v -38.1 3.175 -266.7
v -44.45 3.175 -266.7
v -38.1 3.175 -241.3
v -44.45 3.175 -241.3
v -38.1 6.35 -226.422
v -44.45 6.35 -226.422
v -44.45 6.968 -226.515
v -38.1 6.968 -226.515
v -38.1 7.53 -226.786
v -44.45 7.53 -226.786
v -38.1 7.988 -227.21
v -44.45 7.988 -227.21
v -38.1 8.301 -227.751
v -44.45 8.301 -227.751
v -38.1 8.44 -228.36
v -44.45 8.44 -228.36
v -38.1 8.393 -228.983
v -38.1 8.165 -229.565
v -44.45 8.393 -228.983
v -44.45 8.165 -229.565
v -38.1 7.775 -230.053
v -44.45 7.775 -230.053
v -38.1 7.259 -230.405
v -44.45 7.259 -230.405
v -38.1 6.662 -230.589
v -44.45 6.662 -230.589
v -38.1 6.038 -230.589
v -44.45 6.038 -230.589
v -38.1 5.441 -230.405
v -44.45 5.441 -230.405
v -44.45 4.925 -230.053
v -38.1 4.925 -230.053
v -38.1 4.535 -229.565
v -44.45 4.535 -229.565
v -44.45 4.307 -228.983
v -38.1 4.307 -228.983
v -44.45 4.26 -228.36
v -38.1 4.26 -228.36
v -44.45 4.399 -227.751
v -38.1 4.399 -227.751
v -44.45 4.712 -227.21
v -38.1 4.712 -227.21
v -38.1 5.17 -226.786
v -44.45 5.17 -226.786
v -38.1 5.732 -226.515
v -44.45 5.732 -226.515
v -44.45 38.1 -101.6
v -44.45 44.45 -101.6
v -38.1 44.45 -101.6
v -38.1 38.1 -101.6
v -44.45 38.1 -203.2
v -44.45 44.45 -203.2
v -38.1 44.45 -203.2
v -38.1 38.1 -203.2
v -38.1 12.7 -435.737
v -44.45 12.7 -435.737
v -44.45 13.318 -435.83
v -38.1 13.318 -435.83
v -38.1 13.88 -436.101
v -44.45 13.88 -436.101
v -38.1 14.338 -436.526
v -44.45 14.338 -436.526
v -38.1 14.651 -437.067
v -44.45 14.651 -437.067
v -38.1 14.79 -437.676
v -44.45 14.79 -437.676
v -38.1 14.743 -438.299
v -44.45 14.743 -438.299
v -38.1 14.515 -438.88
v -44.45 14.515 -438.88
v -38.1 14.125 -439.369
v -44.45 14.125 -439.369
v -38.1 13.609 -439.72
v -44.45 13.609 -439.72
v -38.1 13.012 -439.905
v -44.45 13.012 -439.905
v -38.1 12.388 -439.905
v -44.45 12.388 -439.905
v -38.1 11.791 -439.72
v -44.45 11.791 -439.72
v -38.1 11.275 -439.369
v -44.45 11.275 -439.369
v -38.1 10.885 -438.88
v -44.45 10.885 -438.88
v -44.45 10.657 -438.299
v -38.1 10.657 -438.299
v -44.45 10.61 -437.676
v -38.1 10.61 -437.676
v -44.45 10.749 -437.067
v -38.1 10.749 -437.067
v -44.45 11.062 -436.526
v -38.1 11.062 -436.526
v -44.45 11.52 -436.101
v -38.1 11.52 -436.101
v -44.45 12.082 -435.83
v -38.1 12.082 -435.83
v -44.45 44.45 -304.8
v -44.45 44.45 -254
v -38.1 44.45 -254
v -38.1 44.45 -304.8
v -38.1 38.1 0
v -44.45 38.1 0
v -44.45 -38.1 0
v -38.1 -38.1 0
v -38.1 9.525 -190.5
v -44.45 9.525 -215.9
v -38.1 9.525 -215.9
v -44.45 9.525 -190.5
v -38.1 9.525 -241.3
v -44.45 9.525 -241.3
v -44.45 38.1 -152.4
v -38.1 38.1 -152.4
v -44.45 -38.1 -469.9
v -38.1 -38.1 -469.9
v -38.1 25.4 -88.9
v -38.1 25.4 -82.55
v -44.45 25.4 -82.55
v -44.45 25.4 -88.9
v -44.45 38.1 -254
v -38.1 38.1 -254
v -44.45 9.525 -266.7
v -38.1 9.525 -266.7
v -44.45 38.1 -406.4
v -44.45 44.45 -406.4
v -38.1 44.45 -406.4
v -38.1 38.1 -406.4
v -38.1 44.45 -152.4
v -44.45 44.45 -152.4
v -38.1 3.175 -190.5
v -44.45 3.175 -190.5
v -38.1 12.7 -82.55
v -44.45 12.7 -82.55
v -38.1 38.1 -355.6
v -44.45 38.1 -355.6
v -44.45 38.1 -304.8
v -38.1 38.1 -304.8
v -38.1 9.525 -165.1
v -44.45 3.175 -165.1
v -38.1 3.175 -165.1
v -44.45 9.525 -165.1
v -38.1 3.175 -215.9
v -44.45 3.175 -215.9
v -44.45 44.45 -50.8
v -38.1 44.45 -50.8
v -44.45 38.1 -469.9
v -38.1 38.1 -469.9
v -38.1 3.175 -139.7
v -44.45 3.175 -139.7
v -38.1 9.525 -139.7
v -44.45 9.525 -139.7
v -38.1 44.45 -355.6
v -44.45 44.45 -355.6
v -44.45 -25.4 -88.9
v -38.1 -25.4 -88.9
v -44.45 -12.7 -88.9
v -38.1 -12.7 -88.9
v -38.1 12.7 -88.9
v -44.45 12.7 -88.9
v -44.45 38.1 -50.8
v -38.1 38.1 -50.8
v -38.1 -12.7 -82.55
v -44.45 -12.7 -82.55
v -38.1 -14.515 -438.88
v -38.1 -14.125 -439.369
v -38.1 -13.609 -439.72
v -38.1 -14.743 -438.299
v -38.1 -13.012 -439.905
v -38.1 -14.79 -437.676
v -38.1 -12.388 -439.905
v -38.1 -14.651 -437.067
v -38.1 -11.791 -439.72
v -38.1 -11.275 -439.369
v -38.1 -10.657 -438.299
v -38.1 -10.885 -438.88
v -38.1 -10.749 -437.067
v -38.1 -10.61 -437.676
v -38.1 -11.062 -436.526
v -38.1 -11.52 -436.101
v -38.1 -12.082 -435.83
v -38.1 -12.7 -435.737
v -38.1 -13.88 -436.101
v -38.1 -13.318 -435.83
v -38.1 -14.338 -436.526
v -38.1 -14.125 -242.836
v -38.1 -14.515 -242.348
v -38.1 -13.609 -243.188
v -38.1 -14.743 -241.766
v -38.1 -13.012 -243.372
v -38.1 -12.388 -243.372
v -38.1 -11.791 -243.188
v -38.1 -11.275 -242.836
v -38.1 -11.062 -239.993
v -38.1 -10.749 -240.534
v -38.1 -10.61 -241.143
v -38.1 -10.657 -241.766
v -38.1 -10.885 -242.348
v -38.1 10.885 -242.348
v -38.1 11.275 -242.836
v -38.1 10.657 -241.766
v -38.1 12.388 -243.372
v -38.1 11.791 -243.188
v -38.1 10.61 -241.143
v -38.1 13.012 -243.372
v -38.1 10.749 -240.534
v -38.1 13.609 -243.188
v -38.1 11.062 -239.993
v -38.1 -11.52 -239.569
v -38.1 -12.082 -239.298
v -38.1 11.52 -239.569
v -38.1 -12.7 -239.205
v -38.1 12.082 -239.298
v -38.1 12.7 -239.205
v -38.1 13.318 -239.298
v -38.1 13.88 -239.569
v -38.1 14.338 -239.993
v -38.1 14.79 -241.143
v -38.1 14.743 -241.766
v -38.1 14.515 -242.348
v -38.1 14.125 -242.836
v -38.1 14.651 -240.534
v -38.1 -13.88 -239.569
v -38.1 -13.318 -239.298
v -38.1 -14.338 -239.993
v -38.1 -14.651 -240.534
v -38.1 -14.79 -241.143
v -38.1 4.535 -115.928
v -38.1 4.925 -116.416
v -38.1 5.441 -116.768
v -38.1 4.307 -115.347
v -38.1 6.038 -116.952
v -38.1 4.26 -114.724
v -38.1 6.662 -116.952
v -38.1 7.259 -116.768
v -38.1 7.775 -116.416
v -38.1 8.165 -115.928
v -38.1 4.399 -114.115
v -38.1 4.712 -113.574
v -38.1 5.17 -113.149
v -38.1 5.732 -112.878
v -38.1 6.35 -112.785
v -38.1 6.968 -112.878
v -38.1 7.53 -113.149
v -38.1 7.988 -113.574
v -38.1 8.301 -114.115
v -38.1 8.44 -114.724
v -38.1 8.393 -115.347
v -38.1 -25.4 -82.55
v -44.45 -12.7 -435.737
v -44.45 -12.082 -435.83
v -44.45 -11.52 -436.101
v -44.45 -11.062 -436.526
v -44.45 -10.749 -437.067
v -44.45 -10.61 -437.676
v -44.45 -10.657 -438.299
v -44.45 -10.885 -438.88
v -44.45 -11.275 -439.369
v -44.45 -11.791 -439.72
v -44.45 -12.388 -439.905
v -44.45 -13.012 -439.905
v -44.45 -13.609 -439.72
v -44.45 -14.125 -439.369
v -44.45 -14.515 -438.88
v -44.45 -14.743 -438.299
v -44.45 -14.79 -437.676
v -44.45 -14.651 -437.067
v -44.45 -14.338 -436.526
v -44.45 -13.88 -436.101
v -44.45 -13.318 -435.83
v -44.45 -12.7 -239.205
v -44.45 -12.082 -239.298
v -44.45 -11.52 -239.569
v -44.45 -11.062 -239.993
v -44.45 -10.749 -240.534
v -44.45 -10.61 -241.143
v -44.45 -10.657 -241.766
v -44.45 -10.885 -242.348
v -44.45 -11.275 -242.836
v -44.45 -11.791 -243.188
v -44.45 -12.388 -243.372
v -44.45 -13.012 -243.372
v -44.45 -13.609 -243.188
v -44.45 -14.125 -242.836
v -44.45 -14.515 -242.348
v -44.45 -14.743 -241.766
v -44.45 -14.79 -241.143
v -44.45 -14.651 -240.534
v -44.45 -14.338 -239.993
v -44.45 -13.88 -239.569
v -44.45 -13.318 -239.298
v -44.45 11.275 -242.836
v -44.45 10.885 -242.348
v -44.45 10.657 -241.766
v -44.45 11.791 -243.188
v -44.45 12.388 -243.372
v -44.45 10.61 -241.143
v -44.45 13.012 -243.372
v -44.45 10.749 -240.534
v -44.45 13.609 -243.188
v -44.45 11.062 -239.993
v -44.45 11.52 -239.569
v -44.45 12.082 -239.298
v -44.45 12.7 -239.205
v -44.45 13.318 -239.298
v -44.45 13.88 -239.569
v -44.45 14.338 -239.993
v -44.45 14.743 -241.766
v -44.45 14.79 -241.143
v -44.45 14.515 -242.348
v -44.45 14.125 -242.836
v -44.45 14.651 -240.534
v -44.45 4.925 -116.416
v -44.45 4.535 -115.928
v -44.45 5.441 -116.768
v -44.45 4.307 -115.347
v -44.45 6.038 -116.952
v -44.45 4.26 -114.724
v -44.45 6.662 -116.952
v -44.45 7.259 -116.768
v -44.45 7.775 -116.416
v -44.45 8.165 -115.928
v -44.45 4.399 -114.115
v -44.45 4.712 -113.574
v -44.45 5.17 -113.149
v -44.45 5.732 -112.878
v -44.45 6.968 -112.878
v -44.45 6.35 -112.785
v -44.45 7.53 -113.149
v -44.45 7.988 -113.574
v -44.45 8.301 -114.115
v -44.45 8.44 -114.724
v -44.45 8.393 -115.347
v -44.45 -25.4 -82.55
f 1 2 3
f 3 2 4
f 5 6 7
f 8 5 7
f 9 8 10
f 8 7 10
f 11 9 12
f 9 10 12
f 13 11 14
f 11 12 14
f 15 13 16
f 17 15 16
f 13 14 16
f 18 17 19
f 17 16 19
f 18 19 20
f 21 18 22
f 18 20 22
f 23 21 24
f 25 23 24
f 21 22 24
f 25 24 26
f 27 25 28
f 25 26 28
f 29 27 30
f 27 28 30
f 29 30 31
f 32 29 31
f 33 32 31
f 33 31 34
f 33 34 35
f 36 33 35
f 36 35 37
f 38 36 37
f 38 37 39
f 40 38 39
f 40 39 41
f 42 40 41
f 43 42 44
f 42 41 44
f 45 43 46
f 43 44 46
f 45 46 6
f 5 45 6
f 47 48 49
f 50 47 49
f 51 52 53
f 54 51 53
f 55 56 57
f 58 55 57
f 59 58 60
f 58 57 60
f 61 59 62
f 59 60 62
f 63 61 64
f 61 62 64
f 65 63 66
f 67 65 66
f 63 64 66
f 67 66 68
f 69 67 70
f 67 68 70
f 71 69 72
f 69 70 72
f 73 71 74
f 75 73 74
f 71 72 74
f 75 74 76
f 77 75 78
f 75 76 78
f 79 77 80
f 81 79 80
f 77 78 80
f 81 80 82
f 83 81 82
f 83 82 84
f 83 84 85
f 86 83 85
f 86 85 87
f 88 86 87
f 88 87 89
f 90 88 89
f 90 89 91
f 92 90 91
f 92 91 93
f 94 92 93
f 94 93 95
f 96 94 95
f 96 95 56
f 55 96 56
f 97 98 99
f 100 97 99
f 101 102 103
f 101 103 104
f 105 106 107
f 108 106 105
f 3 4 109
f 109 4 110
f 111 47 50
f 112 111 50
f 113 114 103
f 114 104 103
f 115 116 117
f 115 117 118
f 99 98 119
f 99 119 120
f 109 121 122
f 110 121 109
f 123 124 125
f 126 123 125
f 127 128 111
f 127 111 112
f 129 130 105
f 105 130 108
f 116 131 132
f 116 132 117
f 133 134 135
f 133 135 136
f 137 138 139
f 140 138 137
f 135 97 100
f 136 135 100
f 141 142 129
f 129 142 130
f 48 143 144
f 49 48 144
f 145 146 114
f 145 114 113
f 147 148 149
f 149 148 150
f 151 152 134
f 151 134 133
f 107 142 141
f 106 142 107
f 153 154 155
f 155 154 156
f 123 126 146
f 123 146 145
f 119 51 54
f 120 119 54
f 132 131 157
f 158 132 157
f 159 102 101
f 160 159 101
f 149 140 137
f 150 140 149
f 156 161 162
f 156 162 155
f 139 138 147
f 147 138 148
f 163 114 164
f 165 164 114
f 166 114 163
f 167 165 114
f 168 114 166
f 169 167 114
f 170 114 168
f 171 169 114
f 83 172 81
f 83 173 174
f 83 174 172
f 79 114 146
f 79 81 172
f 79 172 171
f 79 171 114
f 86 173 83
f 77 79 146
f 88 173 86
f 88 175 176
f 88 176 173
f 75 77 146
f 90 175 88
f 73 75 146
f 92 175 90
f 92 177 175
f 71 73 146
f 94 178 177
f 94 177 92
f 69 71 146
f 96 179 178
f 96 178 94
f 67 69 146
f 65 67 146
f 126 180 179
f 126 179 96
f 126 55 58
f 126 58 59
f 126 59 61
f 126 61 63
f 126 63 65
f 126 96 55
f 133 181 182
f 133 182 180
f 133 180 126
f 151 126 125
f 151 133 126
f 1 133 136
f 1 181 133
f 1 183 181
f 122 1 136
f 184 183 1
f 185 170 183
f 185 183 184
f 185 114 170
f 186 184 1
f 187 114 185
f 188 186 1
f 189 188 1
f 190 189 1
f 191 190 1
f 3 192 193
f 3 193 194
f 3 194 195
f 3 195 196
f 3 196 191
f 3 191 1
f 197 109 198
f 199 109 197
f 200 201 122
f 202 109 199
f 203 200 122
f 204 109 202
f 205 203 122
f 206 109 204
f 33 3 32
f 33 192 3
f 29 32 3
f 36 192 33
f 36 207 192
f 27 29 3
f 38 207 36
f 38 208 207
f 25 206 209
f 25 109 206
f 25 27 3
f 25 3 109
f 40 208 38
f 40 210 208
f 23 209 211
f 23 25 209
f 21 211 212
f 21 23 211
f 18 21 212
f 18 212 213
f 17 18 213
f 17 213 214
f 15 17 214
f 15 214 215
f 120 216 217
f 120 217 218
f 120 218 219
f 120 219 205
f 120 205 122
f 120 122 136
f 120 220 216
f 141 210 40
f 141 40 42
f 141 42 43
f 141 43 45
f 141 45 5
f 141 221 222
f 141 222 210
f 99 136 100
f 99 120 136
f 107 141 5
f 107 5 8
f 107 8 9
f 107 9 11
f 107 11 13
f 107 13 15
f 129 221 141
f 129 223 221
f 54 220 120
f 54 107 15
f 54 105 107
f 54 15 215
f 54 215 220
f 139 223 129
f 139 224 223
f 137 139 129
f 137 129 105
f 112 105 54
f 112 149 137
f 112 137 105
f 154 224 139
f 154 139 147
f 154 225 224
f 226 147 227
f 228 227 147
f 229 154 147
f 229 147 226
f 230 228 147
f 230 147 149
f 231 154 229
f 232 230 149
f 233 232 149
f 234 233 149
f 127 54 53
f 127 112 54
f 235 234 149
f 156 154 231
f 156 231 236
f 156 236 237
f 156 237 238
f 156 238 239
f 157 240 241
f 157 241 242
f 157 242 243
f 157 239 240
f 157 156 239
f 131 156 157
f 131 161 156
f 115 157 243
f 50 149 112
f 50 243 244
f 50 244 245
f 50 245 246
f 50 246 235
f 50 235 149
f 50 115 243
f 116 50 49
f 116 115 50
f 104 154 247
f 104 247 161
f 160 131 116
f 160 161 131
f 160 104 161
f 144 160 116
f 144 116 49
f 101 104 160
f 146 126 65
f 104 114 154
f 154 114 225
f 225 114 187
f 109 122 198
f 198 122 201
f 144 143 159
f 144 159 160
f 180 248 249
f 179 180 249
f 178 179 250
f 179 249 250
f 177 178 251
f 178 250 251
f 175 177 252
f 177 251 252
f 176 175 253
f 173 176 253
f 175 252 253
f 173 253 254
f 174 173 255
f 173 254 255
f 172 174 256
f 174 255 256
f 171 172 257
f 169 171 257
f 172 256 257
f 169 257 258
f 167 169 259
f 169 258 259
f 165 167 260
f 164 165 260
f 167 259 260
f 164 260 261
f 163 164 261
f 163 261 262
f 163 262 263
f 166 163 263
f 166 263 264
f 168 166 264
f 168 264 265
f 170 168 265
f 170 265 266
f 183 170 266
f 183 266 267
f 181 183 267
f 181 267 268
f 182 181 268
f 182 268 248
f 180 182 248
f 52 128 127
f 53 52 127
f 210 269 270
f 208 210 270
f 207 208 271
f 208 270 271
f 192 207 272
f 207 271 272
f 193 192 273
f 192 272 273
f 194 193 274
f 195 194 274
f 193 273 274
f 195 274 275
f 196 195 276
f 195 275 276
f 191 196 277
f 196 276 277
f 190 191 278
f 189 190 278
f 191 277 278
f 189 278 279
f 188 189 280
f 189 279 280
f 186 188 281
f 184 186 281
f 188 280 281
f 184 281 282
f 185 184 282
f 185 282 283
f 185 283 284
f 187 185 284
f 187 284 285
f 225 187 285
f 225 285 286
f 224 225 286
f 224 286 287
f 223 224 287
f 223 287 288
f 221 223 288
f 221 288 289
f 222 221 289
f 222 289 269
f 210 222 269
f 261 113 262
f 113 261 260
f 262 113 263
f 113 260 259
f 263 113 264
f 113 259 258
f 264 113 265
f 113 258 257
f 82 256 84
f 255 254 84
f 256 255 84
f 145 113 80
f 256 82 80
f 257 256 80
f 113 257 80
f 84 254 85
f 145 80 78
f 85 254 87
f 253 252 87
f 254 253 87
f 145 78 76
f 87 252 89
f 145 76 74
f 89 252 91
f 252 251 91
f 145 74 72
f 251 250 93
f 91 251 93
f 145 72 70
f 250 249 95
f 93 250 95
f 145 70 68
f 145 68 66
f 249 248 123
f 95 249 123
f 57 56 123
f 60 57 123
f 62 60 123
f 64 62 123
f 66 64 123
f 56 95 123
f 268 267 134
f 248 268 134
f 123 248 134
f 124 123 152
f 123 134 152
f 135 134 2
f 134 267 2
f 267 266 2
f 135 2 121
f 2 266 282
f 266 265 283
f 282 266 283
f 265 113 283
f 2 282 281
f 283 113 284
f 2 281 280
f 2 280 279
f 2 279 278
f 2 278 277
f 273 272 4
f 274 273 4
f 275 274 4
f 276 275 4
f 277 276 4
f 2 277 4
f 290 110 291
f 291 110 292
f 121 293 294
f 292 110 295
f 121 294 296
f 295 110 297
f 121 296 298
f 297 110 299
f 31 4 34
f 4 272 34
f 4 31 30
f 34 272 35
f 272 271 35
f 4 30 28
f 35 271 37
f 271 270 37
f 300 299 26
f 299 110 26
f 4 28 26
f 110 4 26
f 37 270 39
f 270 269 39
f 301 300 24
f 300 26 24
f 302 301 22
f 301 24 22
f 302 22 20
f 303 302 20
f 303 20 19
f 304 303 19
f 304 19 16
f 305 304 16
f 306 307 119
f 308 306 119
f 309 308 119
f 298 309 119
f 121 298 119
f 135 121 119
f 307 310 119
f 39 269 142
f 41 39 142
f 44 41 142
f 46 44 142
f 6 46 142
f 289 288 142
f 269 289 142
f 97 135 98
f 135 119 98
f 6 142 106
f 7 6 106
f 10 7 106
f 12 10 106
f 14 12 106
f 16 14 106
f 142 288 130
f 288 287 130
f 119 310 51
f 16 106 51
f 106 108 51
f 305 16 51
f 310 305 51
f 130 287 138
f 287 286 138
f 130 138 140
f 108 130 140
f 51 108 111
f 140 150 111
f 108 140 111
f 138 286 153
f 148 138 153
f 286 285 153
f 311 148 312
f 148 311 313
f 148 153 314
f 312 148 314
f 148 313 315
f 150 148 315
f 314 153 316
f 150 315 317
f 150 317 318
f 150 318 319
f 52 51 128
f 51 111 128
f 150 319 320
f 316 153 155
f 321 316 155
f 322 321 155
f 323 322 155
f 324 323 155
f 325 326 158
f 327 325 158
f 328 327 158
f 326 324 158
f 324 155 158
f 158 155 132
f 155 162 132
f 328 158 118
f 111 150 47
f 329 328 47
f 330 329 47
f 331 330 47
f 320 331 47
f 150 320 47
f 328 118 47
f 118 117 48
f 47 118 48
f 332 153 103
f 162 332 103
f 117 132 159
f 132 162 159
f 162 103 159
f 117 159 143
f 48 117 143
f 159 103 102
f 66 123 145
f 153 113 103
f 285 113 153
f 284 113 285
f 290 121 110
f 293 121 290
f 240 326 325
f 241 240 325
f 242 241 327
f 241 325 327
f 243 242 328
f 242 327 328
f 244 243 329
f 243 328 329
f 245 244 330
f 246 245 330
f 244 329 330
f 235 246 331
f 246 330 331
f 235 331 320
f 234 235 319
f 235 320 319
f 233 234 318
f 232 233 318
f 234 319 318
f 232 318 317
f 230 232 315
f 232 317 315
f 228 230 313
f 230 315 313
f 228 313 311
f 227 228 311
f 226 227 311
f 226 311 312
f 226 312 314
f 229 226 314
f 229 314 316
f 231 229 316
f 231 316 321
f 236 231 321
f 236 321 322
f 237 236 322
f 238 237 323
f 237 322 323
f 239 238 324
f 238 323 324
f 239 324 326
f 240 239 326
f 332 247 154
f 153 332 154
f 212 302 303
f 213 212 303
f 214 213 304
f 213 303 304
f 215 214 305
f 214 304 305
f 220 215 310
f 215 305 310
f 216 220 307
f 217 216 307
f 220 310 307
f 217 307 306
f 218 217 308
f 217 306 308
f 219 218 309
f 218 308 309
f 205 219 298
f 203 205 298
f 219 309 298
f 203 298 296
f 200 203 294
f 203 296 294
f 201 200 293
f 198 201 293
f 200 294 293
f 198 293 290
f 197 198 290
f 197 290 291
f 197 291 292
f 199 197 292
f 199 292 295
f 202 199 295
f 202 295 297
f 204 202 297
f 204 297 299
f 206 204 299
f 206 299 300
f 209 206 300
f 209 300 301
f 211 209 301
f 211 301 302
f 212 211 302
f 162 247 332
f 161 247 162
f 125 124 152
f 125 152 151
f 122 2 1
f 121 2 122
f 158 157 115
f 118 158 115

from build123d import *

# Parameters (mm, degrees)
SKETCH1_W           = 6.35
SKETCH1_H           = 76.2
BOSS_EXTRUDE1_DEPTH = 457.2
SKETCH2_W           = 6.35
SKETCH2_H           = 50.8
BOSS_EXTRUDE2_DEPTH = 6.35
SKETCH3_W           = 6.35
SKETCH3_H           = 12.7
CUT_EXTRUDE1_DEPTH  = 460.399570091
SKETCH7_R           = 2.0955
CUT_EXTRUDE2_DEPTH  = 460.399570091
SKETCH9_R           = 2.0955
SKETCH9_W           = 25.4
SKETCH9_H           = 6.35
CUT_EXTRUDE3_DEPTH  = 6.35
SKETCH11_W          = 6.35
SKETCH11_H          = 76.2
BOSS_EXTRUDE5_DEPTH = 12.7


with BuildPart() as part:
    # Sketch1 → Boss-Extrude1 (new body)
    with BuildSketch(Plane.XY):
        with Locations((-41.275, 0)):
            Rectangle(SKETCH1_W, SKETCH1_H)
    extrude(amount=-BOSS_EXTRUDE1_DEPTH)

    # Sketch2 → Boss-Extrude2 (add)
    with BuildSketch(Plane(origin=(0, 38.1, 0), x_dir=(1, 0, 0), z_dir=(0, 1, 0))):
        with Locations((-41.275, 381)):
            Rectangle(SKETCH2_W, SKETCH2_H)
        with Locations((-41.275, 279.4)):
            Rectangle(SKETCH2_W, SKETCH2_H)
        with Locations((-41.275, 177.8)):
            Rectangle(SKETCH2_W, SKETCH2_H)
        with Locations((-41.275, 76.2)):
            Rectangle(SKETCH2_W, SKETCH2_H)
    extrude(amount=BOSS_EXTRUDE2_DEPTH)

    # Sketch3 → Cut-Extrude1 (cut, through all)
    with BuildSketch(Plane(origin=(-38.1, 0, 0), x_dir=(0, 0, -1), z_dir=(1, 0, 0))):
        with Locations((85.725, 19.05)):
            Rectangle(SKETCH3_W, SKETCH3_H)
        with Locations((85.725, -19.05)):
            Rectangle(SKETCH3_W, SKETCH3_H)
    extrude(amount=-CUT_EXTRUDE1_DEPTH, mode=Mode.SUBTRACT)

    # Sketch7 → Cut-Extrude2 (cut, through all)
    with BuildSketch(Plane.ZY.offset(44.45)):
        with Locations((-241.3, -12.7)):
            Circle(SKETCH7_R)
        with Locations((-241.3, 12.7)):
            Circle(SKETCH7_R)
        with Locations((-437.8325, -12.7)):
            Circle(SKETCH7_R)
        with Locations((-437.8325, 12.7)):
            Circle(SKETCH7_R)
    extrude(amount=-CUT_EXTRUDE2_DEPTH, mode=Mode.SUBTRACT)

    # Sketch9 → Cut-Extrude3 (cut)
    with BuildSketch(Plane.ZY.offset(44.45)):
        with Locations((-114.880216651, 6.35)):
            Circle(SKETCH9_R)
        with Locations((-228.517018256, 6.35)):
            Circle(SKETCH9_R)
        with Locations((-254, 6.35)):
            Rectangle(SKETCH9_W, SKETCH9_H)
        with Locations((-203.2, 6.35)):
            Rectangle(SKETCH9_W, SKETCH9_H)
        with Locations((-152.4, 6.35)):
            Rectangle(SKETCH9_W, SKETCH9_H)
    extrude(amount=-CUT_EXTRUDE3_DEPTH, mode=Mode.SUBTRACT)

    # Sketch11 → Boss-Extrude5 (add)
    with BuildSketch(Plane(origin=(0, 0, -457.2), x_dir=(-1, 0, 0), z_dir=(0, 0, -1))):
        with Locations((41.275, 0)):
            Rectangle(SKETCH11_W, SKETCH11_H)
    extrude(amount=BOSS_EXTRUDE5_DEPTH)


solid = part.part
